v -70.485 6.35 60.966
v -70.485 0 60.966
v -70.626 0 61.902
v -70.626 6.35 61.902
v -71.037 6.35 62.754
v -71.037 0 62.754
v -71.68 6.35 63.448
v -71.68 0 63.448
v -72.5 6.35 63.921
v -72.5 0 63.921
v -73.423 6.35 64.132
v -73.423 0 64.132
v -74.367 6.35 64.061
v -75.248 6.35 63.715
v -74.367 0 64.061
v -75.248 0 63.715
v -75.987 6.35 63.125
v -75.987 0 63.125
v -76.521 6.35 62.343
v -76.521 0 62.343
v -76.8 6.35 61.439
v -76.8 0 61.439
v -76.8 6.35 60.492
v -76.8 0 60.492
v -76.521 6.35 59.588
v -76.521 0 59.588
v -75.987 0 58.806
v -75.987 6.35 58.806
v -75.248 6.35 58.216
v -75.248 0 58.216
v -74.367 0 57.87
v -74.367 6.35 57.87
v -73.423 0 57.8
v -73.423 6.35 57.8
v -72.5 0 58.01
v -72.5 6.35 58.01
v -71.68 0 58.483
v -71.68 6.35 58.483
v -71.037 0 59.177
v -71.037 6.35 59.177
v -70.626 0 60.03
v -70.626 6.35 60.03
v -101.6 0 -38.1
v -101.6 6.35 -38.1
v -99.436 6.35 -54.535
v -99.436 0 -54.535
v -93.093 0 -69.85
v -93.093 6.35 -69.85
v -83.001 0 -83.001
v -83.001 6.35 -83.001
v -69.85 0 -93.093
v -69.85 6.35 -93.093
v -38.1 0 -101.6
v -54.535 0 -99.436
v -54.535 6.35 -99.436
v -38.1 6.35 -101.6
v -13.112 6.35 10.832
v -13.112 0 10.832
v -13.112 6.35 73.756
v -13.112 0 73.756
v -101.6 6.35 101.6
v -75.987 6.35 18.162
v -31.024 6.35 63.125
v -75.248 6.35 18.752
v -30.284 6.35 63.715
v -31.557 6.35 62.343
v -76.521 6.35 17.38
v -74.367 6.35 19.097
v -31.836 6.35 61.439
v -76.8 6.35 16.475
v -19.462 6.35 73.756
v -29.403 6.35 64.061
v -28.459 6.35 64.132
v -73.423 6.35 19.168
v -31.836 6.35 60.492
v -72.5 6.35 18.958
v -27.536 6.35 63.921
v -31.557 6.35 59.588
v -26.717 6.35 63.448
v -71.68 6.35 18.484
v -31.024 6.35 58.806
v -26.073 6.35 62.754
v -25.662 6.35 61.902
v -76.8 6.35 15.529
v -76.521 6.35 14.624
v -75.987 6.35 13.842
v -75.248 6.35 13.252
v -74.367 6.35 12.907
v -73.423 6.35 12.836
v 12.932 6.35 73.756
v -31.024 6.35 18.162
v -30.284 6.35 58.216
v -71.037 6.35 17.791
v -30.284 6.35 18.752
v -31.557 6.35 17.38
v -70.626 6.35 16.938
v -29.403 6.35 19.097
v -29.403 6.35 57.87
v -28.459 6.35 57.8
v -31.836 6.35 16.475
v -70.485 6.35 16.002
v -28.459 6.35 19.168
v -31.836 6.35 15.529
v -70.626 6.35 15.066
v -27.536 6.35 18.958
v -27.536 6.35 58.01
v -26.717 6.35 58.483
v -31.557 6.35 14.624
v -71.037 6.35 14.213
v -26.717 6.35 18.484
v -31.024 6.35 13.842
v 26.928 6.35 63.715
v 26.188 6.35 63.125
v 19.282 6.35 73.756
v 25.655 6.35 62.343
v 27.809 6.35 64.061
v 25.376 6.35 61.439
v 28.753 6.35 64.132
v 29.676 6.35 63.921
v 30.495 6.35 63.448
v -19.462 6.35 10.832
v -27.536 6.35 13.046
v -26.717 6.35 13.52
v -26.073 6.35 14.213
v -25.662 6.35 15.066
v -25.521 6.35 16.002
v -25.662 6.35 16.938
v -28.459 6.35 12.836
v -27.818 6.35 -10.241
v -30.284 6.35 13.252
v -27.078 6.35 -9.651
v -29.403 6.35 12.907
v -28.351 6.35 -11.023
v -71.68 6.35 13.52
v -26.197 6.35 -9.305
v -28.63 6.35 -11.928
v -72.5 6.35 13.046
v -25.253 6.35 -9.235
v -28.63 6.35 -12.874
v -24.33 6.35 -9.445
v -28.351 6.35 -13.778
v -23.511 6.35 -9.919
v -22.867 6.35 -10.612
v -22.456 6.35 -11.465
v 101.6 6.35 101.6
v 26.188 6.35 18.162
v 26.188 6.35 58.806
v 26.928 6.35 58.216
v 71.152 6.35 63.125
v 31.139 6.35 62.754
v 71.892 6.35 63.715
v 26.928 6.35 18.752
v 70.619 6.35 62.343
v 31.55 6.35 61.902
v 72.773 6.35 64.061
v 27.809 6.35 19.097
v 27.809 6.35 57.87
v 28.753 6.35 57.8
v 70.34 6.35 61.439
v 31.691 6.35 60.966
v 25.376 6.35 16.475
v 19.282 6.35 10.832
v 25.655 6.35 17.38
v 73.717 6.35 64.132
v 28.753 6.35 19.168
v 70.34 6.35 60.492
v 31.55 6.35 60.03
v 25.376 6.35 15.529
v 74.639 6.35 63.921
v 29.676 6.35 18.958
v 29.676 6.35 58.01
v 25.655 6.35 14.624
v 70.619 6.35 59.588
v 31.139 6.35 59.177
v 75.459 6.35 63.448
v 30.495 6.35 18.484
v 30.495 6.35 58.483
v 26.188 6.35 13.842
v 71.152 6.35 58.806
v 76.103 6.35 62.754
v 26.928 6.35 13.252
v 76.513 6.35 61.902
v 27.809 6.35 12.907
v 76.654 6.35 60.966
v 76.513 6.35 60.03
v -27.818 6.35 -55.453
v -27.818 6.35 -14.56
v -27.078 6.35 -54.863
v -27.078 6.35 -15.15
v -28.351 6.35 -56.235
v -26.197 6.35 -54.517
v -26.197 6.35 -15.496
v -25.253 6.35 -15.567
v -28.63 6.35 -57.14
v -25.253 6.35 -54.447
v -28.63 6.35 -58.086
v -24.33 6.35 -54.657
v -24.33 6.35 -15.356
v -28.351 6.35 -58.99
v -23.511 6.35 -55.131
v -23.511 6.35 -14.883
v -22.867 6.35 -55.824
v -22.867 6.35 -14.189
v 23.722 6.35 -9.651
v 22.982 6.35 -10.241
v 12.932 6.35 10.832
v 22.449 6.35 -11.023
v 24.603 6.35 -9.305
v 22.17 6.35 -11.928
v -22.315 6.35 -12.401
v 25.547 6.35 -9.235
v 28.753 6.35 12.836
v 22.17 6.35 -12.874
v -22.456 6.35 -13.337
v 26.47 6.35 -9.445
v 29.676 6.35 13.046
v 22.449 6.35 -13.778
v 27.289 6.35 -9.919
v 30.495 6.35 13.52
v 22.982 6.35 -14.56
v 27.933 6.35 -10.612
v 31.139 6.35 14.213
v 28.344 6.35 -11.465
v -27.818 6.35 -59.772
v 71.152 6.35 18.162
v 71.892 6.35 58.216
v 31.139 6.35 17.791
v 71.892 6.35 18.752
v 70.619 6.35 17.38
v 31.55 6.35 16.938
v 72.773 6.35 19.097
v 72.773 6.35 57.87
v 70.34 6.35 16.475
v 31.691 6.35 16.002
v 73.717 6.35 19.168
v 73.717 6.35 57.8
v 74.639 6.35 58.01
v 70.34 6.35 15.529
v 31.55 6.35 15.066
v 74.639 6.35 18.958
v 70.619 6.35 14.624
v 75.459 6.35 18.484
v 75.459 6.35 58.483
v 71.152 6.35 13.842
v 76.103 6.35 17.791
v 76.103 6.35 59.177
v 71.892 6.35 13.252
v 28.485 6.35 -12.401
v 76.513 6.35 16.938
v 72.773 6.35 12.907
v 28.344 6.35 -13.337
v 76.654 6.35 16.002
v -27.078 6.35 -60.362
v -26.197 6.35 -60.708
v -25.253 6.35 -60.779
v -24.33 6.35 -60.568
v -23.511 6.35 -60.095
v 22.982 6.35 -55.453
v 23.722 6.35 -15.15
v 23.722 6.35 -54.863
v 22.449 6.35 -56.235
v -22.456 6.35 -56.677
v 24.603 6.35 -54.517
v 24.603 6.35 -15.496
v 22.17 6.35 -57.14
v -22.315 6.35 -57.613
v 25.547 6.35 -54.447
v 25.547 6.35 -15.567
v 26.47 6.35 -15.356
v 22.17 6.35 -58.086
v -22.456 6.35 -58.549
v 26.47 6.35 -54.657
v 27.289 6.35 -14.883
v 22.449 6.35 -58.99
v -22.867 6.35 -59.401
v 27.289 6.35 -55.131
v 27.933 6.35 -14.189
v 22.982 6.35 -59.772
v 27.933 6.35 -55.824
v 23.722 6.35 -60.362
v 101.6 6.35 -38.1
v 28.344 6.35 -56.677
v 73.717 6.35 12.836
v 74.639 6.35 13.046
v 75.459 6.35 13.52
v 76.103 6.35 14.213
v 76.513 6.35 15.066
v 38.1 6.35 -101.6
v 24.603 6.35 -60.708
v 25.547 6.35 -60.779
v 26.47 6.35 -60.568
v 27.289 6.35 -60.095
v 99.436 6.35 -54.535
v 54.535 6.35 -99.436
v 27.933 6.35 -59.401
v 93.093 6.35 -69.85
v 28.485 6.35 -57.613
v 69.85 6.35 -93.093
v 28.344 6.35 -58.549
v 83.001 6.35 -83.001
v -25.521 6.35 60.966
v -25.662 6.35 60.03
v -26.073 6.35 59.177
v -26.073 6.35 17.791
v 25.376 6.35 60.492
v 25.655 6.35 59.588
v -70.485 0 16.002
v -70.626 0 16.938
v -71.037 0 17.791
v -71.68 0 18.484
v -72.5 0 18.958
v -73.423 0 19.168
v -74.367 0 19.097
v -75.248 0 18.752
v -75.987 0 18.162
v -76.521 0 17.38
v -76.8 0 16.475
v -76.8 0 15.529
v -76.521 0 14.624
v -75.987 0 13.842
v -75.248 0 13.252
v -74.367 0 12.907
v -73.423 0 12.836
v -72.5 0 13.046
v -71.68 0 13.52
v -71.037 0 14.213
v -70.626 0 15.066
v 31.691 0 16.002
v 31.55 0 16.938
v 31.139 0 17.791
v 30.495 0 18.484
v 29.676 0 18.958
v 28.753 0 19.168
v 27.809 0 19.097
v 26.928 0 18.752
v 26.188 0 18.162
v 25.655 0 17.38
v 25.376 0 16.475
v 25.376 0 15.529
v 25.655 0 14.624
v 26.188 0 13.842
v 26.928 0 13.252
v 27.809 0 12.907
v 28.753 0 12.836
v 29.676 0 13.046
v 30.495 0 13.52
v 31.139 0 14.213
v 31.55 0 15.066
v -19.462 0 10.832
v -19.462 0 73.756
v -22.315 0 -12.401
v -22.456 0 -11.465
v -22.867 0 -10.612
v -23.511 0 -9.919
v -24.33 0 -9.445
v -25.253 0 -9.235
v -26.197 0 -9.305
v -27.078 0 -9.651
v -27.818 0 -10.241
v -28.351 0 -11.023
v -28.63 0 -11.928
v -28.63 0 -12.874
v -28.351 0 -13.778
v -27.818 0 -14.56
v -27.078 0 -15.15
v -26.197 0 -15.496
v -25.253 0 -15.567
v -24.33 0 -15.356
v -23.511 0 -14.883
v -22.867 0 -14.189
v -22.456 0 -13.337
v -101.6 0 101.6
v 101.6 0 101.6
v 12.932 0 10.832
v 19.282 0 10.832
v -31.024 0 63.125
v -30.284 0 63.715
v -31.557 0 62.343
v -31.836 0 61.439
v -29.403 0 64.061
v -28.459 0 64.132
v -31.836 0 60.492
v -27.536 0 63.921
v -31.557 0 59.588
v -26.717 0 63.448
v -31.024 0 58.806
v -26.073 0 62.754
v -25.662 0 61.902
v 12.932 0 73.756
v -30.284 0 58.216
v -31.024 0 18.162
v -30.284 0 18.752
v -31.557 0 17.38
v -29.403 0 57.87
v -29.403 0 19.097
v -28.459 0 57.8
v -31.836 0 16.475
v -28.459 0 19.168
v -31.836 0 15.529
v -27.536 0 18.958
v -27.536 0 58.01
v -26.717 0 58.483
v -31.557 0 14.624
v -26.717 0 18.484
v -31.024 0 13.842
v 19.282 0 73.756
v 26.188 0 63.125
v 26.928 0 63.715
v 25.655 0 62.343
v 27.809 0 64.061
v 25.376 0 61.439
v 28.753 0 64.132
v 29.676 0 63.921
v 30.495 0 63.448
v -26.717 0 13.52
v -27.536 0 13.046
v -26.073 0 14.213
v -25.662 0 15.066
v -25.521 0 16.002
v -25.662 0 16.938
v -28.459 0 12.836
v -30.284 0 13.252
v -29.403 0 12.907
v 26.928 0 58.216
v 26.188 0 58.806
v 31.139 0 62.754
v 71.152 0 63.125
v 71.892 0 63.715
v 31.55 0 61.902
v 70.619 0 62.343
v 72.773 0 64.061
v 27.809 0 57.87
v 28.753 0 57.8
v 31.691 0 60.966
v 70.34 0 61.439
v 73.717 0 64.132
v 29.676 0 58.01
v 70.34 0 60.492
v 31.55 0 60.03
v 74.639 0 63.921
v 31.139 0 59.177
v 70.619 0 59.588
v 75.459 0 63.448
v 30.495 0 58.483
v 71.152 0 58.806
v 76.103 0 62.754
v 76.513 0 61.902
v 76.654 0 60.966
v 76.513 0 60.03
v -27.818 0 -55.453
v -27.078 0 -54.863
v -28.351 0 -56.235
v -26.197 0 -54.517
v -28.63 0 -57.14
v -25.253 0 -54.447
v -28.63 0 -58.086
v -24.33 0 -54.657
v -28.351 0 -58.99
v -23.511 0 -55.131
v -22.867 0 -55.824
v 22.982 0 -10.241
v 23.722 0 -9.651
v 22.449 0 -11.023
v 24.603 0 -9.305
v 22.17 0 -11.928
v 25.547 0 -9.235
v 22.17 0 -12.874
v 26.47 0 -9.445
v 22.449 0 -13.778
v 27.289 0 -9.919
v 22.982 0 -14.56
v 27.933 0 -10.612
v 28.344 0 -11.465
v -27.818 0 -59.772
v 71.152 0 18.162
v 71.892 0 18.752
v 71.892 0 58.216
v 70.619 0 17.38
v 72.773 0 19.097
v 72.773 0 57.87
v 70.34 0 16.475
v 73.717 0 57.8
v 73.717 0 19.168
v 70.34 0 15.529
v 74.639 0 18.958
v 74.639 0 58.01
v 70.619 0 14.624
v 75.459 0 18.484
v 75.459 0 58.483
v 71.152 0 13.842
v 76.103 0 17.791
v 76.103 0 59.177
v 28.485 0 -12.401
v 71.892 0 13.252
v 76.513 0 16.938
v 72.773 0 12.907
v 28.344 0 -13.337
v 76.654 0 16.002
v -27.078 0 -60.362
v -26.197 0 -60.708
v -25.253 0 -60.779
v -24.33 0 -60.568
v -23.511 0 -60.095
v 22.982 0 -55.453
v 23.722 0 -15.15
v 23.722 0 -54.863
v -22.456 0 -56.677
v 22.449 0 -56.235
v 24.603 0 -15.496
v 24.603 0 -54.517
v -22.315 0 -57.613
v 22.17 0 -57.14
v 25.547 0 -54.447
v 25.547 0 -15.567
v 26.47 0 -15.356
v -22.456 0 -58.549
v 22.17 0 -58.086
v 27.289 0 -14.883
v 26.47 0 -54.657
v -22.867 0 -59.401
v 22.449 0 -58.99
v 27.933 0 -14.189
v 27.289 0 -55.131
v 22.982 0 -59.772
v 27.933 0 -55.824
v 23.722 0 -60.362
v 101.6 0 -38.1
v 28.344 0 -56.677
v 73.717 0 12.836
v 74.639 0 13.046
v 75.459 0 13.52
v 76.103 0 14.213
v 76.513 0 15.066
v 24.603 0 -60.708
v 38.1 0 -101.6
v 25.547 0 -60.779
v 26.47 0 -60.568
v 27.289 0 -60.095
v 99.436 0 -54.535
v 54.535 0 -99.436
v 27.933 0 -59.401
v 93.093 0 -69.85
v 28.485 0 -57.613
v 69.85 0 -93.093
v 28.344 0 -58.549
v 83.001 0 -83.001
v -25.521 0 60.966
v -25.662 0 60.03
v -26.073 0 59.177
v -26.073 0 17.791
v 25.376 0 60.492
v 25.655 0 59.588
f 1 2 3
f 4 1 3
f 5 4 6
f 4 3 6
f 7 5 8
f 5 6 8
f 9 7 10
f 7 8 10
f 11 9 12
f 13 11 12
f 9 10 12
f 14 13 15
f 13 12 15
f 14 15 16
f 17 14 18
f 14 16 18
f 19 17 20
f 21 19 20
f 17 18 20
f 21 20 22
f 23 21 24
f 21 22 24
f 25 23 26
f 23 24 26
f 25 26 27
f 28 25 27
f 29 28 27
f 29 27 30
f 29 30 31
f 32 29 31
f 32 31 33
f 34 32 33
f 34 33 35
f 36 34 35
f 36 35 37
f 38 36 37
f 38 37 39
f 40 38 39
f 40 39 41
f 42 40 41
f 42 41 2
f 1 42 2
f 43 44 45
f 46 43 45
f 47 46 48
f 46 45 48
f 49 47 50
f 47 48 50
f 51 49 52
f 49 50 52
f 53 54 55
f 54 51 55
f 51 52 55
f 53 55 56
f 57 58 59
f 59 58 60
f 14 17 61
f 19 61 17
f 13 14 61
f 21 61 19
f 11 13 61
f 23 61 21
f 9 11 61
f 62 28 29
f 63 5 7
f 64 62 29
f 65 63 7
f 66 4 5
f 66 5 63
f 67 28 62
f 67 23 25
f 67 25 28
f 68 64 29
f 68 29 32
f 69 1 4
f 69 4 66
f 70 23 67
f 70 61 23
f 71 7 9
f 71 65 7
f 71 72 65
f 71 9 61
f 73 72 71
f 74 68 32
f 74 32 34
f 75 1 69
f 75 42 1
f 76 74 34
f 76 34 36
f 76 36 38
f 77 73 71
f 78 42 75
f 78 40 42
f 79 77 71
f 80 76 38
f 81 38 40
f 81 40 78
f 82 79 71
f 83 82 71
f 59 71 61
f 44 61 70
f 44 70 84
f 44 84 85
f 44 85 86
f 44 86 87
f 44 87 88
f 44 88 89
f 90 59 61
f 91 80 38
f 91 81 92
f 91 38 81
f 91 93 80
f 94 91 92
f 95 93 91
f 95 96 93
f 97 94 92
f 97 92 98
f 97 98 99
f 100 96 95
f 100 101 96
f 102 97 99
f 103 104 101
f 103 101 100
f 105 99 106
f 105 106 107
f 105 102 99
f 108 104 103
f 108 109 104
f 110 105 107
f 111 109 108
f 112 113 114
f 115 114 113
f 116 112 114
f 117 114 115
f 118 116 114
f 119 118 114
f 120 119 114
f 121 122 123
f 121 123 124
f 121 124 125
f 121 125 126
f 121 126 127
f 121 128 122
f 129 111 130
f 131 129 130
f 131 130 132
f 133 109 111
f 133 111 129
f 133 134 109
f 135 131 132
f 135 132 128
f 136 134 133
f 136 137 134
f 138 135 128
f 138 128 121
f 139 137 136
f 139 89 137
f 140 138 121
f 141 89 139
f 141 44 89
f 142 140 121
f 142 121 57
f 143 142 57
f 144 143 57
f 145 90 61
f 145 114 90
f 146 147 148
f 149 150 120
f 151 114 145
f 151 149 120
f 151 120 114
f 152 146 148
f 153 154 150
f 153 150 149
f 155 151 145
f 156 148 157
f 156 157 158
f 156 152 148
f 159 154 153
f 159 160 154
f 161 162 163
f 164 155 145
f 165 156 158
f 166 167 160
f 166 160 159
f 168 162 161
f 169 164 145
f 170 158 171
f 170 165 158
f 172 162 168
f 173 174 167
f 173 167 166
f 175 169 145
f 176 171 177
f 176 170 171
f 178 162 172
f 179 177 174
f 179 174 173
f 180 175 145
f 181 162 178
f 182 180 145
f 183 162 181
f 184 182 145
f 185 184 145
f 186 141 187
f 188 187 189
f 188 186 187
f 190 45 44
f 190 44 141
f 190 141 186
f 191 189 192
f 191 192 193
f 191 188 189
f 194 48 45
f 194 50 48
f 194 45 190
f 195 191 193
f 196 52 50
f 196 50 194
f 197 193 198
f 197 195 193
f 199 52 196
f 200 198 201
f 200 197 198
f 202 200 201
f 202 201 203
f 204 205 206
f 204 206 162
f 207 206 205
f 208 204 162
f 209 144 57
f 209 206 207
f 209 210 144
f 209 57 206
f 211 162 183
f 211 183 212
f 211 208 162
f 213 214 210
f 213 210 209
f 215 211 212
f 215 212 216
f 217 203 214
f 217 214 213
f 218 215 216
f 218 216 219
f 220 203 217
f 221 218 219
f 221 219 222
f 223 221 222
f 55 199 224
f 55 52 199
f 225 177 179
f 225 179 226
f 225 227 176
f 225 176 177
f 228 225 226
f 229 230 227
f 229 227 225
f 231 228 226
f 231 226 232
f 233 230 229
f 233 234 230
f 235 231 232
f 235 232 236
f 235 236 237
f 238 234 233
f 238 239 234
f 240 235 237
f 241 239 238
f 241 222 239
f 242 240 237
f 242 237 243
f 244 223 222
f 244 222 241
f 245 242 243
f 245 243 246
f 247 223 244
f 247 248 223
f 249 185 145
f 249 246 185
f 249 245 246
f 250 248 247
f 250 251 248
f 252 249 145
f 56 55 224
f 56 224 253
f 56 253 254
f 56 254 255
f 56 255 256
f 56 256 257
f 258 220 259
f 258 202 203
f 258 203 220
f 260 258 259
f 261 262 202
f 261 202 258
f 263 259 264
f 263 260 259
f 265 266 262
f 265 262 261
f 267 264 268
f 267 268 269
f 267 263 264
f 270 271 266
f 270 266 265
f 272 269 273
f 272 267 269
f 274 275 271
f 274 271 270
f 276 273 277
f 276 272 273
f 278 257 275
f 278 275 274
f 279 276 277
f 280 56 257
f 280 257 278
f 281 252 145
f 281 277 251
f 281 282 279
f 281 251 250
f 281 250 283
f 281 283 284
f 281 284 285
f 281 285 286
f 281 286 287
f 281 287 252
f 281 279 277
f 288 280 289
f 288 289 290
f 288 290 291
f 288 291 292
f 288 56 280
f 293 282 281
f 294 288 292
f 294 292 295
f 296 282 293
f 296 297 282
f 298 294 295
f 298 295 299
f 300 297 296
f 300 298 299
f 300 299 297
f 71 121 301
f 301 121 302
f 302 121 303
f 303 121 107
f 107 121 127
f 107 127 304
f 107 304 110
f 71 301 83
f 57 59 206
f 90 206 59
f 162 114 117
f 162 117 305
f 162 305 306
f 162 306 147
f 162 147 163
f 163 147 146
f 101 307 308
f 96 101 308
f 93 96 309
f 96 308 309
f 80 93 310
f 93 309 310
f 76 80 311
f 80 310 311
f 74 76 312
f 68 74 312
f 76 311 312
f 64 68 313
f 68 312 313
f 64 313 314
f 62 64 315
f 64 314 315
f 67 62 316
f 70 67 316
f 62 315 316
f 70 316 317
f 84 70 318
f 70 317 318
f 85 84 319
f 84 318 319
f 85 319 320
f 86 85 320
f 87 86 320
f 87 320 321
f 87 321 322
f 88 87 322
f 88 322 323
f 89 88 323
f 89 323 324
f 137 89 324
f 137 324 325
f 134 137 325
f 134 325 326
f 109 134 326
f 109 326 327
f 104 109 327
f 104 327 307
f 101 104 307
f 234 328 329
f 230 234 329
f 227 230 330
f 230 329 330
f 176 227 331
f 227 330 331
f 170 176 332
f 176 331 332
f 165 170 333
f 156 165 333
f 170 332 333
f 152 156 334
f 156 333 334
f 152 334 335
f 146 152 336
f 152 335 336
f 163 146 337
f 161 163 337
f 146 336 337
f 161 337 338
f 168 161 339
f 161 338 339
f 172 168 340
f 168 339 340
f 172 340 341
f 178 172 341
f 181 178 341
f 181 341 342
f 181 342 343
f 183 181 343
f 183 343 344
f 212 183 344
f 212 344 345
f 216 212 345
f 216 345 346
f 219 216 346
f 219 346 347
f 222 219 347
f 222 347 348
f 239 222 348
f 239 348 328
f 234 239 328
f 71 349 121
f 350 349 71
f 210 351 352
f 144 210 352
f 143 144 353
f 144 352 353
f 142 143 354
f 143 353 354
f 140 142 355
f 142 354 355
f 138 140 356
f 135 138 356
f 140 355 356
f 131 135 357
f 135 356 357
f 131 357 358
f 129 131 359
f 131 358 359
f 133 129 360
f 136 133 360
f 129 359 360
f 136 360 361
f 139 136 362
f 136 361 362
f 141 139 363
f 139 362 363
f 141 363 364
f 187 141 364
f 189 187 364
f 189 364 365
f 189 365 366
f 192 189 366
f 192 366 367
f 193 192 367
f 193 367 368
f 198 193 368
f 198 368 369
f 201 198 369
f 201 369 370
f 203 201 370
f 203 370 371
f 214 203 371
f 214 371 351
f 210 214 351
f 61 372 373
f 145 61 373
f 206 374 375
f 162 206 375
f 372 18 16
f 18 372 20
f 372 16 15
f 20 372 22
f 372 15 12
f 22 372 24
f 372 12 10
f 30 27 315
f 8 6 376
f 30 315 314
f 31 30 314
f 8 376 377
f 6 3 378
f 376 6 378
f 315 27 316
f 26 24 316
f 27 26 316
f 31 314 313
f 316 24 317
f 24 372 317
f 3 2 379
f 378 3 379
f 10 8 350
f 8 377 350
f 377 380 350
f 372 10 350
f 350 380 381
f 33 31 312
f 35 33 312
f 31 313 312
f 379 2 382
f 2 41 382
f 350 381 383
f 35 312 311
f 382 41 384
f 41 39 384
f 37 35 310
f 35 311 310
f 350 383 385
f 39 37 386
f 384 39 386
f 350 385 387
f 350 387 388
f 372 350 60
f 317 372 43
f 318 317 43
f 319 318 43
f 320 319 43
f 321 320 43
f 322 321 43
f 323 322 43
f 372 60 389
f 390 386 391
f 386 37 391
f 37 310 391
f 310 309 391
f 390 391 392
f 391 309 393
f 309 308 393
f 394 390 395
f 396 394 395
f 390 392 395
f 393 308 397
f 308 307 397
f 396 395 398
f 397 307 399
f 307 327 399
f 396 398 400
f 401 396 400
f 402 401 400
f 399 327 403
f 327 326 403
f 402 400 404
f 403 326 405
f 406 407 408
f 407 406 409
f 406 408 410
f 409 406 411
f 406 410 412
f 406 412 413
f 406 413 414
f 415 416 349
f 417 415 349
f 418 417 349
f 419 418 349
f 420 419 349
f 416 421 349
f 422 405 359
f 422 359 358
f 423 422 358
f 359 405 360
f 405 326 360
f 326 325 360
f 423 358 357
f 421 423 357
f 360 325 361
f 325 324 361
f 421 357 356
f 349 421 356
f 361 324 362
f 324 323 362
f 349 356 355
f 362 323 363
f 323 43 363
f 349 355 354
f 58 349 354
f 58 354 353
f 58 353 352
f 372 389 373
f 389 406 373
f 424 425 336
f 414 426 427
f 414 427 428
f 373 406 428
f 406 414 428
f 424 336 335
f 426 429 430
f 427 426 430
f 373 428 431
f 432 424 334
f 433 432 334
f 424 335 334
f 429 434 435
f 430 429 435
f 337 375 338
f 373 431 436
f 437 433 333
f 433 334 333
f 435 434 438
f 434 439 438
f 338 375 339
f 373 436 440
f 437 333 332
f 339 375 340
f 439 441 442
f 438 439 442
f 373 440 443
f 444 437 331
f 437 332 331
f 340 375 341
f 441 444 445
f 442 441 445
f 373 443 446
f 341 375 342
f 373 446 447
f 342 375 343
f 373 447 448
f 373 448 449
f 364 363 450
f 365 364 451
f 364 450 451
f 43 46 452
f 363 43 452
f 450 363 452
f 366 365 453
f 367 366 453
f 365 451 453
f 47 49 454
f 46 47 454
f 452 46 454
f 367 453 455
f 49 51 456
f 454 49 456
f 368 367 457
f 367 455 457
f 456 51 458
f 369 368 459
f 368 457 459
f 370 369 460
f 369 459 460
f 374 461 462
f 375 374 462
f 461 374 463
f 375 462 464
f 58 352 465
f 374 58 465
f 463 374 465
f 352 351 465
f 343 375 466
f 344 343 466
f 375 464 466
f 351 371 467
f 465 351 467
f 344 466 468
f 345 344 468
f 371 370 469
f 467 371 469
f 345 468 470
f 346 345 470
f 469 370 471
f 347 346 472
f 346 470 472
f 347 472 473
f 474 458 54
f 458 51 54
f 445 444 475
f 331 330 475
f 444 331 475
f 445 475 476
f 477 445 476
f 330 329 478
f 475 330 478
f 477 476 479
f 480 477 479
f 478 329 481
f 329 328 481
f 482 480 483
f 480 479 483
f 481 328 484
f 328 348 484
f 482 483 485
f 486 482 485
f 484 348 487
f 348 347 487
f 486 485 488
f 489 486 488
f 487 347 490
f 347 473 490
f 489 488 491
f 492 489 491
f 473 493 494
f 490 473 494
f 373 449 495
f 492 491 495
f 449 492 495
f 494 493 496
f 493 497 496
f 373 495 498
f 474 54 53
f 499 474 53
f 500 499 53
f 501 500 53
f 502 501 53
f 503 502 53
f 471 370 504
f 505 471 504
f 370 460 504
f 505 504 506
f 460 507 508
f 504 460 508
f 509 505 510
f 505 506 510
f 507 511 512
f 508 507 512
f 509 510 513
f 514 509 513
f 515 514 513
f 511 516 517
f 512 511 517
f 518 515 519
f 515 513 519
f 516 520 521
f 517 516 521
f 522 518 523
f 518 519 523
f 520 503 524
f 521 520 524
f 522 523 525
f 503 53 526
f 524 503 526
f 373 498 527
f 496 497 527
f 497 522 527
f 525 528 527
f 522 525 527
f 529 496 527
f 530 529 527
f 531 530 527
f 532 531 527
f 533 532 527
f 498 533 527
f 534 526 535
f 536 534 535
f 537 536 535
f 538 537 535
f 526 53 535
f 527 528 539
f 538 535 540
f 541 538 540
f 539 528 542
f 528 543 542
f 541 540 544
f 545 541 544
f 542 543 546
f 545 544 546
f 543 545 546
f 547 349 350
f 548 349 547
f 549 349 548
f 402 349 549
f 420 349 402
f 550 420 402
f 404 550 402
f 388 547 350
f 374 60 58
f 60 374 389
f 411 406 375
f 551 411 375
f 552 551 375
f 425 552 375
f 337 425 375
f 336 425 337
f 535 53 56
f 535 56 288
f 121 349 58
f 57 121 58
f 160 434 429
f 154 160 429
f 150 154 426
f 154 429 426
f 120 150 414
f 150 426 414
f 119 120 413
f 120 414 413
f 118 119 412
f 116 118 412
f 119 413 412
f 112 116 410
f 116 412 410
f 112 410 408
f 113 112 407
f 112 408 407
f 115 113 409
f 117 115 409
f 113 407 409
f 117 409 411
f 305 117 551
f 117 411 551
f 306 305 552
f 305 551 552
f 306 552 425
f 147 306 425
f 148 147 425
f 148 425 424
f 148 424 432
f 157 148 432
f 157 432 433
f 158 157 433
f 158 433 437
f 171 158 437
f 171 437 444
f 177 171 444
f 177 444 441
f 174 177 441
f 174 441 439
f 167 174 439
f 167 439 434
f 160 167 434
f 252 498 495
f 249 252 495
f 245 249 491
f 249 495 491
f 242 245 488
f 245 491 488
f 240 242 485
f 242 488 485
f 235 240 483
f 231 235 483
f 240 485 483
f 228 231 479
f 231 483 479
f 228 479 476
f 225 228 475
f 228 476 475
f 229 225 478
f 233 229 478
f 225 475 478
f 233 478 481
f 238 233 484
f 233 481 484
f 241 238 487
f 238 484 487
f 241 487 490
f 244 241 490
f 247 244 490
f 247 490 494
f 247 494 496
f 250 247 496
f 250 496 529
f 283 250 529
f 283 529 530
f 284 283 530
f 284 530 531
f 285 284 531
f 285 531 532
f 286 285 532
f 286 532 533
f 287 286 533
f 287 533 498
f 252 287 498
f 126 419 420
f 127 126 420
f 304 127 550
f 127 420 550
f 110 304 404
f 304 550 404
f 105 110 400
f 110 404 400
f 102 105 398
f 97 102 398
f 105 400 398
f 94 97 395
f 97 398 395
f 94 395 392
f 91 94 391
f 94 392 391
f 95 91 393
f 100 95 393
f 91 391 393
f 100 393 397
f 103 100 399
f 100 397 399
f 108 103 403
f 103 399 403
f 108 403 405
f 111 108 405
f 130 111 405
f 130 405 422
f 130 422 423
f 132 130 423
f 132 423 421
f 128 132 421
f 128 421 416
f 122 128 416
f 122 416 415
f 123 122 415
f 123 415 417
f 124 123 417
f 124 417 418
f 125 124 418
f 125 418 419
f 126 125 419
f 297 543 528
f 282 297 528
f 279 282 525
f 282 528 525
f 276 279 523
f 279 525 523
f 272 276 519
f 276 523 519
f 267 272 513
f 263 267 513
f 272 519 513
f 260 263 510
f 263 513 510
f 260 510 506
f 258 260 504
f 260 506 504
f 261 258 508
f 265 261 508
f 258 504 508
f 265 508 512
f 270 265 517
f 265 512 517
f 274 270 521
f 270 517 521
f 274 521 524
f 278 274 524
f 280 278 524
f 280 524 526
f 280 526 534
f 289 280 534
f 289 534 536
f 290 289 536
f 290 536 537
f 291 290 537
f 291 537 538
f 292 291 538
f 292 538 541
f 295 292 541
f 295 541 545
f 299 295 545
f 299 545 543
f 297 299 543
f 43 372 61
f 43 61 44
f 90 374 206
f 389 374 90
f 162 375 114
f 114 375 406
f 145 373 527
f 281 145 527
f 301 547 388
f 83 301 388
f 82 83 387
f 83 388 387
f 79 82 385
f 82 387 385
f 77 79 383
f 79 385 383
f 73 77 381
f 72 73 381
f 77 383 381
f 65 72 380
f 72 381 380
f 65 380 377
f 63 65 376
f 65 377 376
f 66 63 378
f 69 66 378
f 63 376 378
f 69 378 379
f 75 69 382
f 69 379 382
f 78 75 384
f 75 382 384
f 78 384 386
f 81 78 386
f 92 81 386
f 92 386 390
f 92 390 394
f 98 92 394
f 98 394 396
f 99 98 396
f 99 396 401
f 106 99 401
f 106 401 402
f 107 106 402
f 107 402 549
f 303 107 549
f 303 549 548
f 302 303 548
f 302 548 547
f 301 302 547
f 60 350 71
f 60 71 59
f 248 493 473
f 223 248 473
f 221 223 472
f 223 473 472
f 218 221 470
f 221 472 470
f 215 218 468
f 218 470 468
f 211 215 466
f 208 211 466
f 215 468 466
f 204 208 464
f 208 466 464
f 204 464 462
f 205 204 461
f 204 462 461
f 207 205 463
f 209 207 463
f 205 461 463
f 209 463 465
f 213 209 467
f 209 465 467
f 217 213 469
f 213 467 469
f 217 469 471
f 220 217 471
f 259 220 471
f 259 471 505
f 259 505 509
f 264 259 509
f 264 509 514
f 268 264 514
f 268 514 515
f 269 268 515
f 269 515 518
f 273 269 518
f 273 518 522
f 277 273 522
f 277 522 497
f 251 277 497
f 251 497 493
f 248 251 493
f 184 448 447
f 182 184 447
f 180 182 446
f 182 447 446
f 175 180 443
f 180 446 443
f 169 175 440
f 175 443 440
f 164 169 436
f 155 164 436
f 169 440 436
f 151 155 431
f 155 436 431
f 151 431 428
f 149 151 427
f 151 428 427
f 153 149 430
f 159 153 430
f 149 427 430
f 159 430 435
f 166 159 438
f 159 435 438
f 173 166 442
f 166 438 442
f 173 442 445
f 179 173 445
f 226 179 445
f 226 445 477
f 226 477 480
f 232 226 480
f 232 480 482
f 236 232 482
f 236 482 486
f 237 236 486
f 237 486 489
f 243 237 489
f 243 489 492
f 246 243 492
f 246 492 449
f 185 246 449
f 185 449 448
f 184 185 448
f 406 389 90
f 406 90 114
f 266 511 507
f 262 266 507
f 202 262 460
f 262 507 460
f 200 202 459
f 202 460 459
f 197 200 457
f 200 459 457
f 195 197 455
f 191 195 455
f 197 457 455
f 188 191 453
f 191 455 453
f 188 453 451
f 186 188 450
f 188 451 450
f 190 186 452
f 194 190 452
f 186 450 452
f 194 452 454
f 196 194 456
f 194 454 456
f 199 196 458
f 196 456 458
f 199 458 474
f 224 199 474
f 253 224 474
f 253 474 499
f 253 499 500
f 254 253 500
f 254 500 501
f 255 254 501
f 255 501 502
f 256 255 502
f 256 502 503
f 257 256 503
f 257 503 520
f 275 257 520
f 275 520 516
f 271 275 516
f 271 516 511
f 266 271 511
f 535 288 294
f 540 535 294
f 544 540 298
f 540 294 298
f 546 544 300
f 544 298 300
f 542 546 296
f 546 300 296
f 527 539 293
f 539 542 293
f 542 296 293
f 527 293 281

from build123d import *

# Parameters (mm, degrees)
SKETCH1_W           = 203.2
SKETCH1_H           = 203.2
BOSS_EXTRUDE1_DEPTH = 6.35
CUT_EXTRUDE1_DEPTH  = 7.35
SKETCH10_R          = 3.175
SKETCH10_W          = 6.35
SKETCH10_H          = 62.924217451
CUT_EXTRUDE4_DEPTH  = 7.35


with BuildPart() as part:
    # Sketch1 → Boss-Extrude1 (new body)
    with BuildSketch(Plane(origin=(0, 0, 0), x_dir=(1, 0, 0), z_dir=(0, 1, 0))):
        Rectangle(SKETCH1_W, SKETCH1_H)
    extrude(amount=BOSS_EXTRUDE1_DEPTH)

    # Sketch2 → Cut-Extrude1 (cut, through all)
    with BuildSketch(Plane(origin=(0, 6.35, 0), x_dir=(1, 0, 0), z_dir=(0, 1, 0))):
        with BuildLine():
            Line((101.6, 38.1), (101.6, 101.6))
            Line((101.6, 101.6), (38.1, 101.6))
            ThreePointArc((38.1, 101.6), (83.001280605, 83.001280605), (101.6, 38.1))
        make_face()
        with BuildLine():
            Line((-38.1, 101.6), (-101.6, 101.6))
            Line((-101.6, 101.6), (-101.6, 38.1))
            ThreePointArc((-101.6, 38.1), (-83.001280605, 83.001280605), (-38.1, 101.6))
        make_face()
    extrude(amount=-CUT_EXTRUDE1_DEPTH, mode=Mode.SUBTRACT)

    # Sketch10 → Cut-Extrude4 (cut, through all)
    with BuildSketch(Plane.XZ):
        with Locations((25.309743879, -12.40083867)):
            Circle(SKETCH10_R)
        with Locations((-25.490256121, -12.40083867)):
            Circle(SKETCH10_R)
        with Locations((-25.490256121, -57.61283867)):
            Circle(SKETCH10_R)
        with Locations((25.309743879, -57.61283867)):
            Circle(SKETCH10_R)
        with Locations((-73.66, 16.002)):
            Circle(SKETCH10_R)
        with Locations((-73.66, 60.965705209)):
            Circle(SKETCH10_R)
        with Locations((-28.696294791, 60.965705209)):
            Circle(SKETCH10_R)
        with Locations((-28.696294791, 16.002)):
            Circle(SKETCH10_R)
        with Locations((28.515782549, 60.965705209)):
            Circle(SKETCH10_R)
        with Locations((73.479487758, 60.965705209)):
            Circle(SKETCH10_R)
        with Locations((73.479487758, 16.002)):
            Circle(SKETCH10_R)
        with Locations((28.515782549, 16.002)):
            Circle(SKETCH10_R)
        with Locations((-16.28703867, 42.293852605)):
            Rectangle(SKETCH10_W, SKETCH10_H)
        with Locations((16.106526428, 42.293852605)):
            Rectangle(SKETCH10_W, SKETCH10_H)
    extrude(amount=-CUT_EXTRUDE4_DEPTH, mode=Mode.SUBTRACT)


solid = part.part
